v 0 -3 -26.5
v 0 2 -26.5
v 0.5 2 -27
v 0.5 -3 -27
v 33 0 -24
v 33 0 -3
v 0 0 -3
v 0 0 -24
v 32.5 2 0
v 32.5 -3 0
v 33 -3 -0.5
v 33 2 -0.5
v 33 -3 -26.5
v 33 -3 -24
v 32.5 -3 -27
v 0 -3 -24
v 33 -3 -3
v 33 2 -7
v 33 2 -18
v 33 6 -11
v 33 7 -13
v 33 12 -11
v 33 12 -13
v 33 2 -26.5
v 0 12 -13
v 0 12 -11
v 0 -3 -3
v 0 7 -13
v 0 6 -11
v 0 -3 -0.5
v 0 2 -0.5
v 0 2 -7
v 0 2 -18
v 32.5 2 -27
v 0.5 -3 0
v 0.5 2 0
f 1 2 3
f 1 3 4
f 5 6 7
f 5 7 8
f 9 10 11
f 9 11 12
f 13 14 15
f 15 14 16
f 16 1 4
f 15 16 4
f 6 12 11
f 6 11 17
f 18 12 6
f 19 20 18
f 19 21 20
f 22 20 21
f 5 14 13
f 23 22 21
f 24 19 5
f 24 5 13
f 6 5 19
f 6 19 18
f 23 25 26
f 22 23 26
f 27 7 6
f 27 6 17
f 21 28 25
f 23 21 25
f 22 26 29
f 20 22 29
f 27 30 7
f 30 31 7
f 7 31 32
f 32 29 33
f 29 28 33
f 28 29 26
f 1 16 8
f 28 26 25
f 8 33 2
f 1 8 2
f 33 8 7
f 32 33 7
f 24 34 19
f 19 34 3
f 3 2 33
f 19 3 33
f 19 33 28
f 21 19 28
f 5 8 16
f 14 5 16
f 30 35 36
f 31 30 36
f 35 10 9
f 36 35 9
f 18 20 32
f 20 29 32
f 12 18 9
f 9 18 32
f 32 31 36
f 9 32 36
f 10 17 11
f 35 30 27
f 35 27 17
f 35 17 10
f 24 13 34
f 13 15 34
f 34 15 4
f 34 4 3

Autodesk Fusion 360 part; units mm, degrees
sketch "スケッチ1" plane through (0, 0, 0) normal (1, 0, 0) x (0, 0, -1)
  line L0 (0, 2) -> (0, 0)
  line L1 (3, 0) -> (24, 0)
  line L2 (27, 0) -> (27, 2)
  line L3 (27, 2) -> (18, 2)
  line L4 (18, 2) -> (13, 7)
  line L5 (13, 7) -> (13, 12)
  line L6 (13, 12) -> (11, 12)
  line L7 (11, 12) -> (11, 6)
  line L8 (7, 2) -> (0, 2)
  line L9 (11, 6) -> (7, 2)
  line L10 (3, 0) -> (3, -3)
  line L11 (3, -3) -> (0, -3)
  line L12 (0, -3) -> (0, 0)
  line L13 (24, 0) -> (24, -3)
  line L14 (24, -3) -> (27, -3)
  line L15 (27, -3) -> (27, 0)
  point P0 (11, 2)
  dimension "d1" = 4
  dimension "d2" = 4
  dimension "d15" = 27
  dimension "d16" = 3
  dimension "d17" = 3
  dimension "d18" = 3
  dimension "d19" = 3
extrude "押し出し1" add sketch "スケッチ1" along normal blind 33
chamfer "面取り1" distance 0.5 angle 45 1 edges at (0, -0.5, -27)
chamfer "面取り2" distance 0.5 angle 45 1 edges at (0, -0.5, 0)
chamfer "面取り3" distance 0.5 angle 45 1 edges at (33, -0.5, -27)
chamfer "面取り4" distance 0.5 angle 45 1 edges at (33, -0.5, 0)
